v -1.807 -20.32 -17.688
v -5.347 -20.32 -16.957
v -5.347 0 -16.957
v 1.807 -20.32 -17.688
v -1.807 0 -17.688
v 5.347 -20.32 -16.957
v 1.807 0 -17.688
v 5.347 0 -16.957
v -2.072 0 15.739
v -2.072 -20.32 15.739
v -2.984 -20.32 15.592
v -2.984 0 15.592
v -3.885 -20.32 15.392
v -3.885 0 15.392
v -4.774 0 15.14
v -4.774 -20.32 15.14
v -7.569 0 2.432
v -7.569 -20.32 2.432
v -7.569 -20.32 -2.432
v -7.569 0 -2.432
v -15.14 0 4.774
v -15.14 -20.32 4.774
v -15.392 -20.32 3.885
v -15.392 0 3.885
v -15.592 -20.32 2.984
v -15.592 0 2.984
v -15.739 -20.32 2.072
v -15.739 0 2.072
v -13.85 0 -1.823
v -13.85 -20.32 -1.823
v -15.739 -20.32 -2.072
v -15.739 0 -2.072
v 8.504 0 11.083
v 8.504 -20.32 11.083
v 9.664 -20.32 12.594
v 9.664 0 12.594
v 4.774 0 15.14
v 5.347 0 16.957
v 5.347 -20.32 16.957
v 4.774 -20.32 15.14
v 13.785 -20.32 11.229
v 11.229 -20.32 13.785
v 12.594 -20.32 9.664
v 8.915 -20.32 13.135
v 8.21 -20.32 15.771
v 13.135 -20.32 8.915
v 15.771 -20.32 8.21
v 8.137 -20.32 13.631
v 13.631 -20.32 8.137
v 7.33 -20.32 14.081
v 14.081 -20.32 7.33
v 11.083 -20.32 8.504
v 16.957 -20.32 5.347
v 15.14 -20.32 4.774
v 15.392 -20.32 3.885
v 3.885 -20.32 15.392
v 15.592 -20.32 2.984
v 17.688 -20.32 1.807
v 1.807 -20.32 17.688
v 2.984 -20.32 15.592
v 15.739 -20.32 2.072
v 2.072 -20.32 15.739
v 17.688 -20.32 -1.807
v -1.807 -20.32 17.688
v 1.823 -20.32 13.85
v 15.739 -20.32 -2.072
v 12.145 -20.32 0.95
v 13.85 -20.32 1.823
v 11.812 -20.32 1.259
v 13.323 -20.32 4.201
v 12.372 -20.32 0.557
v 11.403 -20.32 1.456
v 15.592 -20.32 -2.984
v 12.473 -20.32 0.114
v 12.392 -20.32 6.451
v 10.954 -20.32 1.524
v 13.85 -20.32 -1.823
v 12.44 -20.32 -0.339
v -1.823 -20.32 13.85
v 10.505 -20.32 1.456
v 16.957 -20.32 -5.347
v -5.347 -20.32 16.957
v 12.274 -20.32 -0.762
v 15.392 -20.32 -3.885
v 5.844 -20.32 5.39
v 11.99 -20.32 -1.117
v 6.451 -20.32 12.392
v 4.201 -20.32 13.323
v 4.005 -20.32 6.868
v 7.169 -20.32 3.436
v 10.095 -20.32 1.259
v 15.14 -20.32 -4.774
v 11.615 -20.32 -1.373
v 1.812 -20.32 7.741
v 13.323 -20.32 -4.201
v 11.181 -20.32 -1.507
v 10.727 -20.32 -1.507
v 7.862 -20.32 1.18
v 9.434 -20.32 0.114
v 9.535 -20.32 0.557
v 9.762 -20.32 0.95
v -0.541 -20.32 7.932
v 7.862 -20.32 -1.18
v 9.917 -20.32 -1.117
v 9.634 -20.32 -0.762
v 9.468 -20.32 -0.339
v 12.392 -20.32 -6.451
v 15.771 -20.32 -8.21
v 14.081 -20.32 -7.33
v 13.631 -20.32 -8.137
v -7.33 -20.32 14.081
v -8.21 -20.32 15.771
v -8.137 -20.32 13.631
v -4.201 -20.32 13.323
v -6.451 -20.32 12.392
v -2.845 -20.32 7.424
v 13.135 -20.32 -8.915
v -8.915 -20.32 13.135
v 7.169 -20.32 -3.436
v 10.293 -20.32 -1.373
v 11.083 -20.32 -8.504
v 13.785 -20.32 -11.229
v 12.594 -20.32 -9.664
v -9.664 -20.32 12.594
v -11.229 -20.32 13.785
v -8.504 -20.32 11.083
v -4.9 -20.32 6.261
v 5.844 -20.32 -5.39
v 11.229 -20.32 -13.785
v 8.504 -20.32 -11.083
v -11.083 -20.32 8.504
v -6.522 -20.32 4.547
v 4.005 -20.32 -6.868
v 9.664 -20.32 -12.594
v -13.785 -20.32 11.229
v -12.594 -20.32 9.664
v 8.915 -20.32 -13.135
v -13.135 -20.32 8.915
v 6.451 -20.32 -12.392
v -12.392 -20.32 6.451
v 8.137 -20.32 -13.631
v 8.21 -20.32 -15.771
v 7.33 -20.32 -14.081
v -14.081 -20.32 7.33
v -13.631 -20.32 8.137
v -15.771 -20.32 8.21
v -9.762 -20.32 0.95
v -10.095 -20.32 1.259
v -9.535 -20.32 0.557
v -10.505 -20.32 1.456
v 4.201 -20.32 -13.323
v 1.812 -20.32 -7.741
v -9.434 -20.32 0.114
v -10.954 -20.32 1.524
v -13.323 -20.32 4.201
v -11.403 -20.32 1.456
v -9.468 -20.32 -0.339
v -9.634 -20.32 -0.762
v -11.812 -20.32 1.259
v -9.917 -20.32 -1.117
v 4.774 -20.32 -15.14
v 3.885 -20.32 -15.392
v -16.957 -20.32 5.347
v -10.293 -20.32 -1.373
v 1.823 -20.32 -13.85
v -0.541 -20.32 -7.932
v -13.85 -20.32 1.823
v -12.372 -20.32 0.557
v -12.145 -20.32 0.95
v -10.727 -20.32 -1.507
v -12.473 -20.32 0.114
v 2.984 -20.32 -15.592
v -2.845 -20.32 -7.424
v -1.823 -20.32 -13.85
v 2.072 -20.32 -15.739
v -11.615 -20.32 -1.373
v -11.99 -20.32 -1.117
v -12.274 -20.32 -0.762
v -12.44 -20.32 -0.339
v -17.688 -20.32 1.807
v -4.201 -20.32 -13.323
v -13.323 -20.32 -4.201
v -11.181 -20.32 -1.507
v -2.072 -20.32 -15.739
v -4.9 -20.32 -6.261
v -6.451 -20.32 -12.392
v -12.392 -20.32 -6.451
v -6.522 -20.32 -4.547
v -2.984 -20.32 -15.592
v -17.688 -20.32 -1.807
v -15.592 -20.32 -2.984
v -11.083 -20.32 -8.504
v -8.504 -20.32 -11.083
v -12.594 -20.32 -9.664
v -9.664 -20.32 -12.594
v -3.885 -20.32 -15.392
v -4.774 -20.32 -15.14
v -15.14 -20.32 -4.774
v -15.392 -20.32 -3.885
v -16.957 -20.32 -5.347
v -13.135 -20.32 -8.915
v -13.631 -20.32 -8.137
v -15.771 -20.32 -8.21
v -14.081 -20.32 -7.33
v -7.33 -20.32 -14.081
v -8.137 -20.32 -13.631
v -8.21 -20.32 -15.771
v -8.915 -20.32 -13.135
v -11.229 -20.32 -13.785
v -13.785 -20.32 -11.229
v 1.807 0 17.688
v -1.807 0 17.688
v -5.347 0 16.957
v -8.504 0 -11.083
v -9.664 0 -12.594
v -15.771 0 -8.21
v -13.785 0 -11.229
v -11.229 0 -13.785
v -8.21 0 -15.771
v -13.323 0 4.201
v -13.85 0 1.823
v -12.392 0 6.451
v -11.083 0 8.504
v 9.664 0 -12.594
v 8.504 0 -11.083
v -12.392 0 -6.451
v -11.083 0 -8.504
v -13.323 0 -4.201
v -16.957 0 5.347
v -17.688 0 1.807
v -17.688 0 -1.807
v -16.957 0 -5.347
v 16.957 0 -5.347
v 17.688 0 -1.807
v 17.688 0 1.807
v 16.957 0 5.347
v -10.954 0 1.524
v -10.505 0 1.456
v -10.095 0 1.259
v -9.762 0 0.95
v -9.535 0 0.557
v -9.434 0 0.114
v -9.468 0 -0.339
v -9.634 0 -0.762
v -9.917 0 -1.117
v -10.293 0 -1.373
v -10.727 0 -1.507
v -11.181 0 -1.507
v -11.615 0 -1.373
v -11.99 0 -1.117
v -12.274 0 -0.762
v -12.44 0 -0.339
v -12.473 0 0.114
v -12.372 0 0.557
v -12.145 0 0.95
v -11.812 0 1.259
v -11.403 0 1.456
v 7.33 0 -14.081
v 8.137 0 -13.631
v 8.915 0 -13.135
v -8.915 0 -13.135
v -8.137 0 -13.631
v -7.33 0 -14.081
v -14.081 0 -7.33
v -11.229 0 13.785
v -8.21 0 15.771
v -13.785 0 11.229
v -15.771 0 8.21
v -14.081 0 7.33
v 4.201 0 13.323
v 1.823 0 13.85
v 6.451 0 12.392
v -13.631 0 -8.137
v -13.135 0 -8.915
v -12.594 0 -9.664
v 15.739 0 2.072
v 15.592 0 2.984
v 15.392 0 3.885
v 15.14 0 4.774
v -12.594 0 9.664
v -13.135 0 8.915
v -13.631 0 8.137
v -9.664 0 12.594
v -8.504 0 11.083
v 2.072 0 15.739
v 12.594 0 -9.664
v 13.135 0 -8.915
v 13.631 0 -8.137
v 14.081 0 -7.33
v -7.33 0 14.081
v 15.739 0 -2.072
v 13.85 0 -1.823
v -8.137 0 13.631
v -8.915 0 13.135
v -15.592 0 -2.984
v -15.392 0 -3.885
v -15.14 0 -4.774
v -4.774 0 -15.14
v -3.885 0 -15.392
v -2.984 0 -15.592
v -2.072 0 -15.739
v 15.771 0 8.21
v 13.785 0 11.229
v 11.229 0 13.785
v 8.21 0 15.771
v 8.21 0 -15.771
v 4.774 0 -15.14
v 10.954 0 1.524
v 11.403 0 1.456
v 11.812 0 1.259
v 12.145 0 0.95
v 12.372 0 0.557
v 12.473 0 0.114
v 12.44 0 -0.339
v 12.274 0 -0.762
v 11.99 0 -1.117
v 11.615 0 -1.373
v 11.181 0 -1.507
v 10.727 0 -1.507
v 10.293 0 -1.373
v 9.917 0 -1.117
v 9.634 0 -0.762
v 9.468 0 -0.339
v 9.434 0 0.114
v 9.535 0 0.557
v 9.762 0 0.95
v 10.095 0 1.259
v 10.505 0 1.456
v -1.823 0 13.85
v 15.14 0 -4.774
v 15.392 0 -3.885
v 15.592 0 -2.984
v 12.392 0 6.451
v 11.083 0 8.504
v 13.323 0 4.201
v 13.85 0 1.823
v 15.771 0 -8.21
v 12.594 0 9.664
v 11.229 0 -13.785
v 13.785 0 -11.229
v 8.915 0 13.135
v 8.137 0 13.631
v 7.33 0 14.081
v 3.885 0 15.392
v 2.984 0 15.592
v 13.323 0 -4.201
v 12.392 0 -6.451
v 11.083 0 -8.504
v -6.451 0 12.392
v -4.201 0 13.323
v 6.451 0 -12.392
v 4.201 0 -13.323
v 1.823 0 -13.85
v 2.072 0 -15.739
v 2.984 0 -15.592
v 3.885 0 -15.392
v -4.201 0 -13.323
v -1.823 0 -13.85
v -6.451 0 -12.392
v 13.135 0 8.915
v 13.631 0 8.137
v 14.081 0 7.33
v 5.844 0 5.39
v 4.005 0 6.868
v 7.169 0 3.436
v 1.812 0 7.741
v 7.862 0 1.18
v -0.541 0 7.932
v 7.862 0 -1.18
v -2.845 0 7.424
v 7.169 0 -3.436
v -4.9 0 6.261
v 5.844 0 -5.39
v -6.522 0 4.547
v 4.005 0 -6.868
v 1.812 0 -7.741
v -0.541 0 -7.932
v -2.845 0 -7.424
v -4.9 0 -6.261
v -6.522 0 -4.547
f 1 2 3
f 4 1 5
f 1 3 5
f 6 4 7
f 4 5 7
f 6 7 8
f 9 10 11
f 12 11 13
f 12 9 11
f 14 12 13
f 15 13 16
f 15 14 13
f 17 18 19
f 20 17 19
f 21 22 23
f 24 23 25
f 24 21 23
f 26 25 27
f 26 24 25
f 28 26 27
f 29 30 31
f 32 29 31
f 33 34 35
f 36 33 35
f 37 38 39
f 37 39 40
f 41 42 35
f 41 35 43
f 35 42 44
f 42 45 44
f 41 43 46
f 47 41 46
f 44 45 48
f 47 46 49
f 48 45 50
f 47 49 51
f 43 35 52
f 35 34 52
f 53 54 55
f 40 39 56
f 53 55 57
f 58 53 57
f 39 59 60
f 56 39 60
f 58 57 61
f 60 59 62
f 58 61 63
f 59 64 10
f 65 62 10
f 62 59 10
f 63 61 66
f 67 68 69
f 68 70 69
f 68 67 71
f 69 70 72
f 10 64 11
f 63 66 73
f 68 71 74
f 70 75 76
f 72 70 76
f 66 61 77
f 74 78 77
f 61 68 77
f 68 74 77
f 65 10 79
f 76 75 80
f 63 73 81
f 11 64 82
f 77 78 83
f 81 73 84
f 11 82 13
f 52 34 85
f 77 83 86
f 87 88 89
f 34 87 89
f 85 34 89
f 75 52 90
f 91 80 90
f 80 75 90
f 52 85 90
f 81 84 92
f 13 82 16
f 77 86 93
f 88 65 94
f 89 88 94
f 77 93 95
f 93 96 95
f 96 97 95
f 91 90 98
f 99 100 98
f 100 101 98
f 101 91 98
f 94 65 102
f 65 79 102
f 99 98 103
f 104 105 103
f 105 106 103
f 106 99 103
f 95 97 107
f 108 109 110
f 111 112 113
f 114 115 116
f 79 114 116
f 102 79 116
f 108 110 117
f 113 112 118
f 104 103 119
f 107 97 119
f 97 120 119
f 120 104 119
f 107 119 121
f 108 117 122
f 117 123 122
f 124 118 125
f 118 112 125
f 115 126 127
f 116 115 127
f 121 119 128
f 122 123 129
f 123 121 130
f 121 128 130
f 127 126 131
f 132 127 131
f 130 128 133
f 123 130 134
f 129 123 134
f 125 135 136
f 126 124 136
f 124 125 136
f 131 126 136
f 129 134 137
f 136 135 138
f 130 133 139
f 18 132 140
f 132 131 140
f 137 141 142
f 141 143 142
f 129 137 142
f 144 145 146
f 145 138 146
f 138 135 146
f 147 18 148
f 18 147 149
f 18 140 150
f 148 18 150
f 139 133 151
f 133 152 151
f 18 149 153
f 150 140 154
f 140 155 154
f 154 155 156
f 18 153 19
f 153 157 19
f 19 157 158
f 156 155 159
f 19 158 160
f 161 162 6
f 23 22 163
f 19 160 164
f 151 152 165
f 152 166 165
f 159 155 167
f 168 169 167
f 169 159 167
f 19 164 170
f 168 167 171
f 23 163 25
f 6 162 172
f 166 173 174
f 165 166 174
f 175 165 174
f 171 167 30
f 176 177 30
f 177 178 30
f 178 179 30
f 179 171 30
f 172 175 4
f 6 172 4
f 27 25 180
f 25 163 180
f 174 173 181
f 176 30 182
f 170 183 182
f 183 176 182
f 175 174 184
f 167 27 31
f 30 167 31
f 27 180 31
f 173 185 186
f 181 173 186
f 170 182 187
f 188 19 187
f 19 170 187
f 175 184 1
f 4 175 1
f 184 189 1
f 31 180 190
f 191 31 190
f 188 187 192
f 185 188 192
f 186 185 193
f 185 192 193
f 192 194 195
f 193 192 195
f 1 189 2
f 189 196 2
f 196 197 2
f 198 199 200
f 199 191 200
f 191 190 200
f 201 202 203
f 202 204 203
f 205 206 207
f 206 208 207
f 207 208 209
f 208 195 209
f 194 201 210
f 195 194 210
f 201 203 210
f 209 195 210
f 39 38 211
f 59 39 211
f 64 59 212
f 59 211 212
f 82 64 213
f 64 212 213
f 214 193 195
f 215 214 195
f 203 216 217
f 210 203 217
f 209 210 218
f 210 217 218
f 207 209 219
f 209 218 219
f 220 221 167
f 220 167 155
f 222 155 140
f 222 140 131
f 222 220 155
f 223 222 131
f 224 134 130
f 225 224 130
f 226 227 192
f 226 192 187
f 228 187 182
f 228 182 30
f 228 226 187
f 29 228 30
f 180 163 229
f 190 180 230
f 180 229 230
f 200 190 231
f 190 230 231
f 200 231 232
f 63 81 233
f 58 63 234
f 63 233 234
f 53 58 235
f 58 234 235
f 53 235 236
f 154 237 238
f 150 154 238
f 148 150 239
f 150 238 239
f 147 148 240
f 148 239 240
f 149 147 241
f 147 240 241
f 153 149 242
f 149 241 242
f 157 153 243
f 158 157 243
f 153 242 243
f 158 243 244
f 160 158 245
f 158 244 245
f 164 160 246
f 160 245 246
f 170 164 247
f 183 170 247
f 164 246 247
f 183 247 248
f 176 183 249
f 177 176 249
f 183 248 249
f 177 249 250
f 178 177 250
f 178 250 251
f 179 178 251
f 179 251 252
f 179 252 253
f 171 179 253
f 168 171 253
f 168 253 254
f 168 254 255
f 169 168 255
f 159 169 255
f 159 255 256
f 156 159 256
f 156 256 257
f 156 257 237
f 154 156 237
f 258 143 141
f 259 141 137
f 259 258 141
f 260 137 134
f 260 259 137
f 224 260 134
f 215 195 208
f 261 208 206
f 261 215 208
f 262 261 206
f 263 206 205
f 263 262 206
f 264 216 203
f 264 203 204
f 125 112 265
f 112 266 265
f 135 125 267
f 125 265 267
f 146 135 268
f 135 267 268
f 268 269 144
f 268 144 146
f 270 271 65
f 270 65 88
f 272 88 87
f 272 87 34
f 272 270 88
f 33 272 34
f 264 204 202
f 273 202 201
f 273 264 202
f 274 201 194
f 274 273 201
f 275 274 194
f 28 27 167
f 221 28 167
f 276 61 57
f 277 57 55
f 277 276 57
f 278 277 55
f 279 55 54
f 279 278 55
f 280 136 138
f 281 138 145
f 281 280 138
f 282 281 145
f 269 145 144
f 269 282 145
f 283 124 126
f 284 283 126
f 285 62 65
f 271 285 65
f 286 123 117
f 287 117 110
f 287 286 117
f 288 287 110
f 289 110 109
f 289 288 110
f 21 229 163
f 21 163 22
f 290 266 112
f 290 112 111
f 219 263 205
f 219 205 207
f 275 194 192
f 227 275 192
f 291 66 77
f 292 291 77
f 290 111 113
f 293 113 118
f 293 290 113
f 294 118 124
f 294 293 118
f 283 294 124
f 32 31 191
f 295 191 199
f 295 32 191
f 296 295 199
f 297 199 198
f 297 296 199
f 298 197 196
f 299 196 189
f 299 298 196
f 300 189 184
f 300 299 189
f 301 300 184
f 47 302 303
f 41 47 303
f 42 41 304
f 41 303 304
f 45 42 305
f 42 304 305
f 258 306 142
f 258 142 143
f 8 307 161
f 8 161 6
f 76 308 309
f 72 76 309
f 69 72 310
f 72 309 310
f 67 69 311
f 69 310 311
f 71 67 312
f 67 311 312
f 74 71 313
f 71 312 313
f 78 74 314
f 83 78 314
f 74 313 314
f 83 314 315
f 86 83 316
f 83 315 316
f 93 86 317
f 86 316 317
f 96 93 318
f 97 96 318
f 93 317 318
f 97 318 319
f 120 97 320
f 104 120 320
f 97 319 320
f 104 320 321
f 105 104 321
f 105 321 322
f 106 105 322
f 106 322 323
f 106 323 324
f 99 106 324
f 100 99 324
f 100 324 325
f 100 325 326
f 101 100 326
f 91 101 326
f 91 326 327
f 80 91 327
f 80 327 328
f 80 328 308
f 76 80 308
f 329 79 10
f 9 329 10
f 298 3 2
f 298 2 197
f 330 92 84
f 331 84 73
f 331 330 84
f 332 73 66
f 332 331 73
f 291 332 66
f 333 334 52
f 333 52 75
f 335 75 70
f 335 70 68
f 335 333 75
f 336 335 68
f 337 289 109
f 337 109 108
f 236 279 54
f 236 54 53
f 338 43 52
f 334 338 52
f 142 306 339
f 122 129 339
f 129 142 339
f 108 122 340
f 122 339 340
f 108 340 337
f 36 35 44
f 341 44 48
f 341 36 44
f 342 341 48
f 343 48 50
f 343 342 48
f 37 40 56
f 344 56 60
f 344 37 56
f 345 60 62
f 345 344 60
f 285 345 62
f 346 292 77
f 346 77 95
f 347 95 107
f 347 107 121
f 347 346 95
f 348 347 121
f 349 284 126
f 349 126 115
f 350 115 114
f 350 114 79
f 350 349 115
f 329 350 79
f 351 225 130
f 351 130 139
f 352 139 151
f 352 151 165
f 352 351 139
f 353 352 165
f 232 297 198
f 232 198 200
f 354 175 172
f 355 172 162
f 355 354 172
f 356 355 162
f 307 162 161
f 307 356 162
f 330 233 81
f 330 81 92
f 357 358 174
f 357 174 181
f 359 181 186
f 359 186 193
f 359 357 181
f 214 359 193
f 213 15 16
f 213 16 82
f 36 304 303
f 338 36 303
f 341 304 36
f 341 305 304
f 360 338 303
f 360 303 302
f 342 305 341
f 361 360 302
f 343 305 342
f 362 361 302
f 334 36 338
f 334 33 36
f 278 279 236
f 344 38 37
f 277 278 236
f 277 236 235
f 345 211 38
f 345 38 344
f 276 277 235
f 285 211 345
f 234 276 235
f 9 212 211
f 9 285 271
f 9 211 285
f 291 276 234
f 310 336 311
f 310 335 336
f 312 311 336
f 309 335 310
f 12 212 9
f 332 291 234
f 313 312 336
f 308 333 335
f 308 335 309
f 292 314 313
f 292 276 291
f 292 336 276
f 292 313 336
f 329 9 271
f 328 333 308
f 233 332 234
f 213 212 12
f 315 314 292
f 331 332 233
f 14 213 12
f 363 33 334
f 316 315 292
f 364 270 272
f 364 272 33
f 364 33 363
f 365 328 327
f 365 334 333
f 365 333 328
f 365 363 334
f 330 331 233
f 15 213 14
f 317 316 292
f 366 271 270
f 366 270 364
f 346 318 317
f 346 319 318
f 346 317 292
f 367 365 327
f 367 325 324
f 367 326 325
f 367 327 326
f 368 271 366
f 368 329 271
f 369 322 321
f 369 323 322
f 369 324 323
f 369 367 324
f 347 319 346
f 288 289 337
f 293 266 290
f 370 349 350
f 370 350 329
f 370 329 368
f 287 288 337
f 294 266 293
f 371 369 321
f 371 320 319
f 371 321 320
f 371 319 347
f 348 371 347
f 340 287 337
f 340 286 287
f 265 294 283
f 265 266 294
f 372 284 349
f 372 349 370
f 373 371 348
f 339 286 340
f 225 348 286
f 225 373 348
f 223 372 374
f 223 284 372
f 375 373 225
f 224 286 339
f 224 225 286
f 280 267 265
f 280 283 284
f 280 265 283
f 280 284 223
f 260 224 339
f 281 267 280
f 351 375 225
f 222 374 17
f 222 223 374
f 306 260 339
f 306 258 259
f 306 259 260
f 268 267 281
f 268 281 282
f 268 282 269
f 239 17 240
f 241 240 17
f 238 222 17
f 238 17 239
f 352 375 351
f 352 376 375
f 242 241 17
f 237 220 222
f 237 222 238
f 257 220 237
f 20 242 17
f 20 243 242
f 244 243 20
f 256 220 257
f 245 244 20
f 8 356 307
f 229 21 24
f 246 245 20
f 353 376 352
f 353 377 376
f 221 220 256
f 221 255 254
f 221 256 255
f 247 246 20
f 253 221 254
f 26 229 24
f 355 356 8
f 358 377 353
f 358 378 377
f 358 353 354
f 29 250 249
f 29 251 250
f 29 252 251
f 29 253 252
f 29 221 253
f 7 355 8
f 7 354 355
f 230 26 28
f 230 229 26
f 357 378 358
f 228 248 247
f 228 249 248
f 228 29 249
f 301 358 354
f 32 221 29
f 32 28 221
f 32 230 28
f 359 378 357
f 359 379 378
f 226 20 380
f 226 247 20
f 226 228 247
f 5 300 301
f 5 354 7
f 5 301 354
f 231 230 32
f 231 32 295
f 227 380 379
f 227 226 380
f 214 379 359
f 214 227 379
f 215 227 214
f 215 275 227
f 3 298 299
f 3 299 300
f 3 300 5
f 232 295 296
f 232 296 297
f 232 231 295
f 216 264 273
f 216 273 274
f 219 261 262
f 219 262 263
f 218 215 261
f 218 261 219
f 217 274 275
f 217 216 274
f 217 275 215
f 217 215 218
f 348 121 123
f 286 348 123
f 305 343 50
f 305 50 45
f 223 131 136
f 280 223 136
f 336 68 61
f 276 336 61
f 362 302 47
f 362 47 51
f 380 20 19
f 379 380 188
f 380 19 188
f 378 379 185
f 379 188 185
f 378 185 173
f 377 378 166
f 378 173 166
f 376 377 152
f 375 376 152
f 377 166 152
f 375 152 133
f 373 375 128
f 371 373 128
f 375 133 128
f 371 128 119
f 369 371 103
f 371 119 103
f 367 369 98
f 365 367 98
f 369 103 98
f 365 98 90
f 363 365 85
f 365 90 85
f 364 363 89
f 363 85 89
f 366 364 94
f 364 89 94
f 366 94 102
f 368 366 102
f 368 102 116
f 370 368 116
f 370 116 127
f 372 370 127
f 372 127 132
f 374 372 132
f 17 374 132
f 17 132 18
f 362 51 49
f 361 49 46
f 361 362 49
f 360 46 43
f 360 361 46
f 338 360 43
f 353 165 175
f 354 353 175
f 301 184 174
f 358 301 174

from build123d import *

# Parameters (mm, degrees)
SKETCH1_W           = 5.08
SKETCH1_H           = 0.3048
CUT_EXTRUDE1_DEPTH  = 33.328922036
CIRPATTERN1_COUNT   = 8
BOSS_EXTRUDE1_START = -20.32
BOSS_EXTRUDE1_DEPTH = 20.32
SKETCH8_R           = 1.524
CUT_EXTRUDE2_DEPTH  = 33.328922036


with BuildPart() as part:
    # Sketch1 → Revolve1 (revolve)
    with BuildSketch(Plane.YZ):
        with Locations((-2.54, 14.4526)):
            Rectangle(SKETCH1_W, SKETCH1_H)
        Polygon((0, 14.3002), (0, 7.9502), (-20.32, 7.9502), (-20.32, 17.78), (0, 17.78), (0, 14.605), (-5.08, 14.605), (-5.08, 14.3002), align=None)
    revolve(axis=Axis((0, 0, 0), (0, -1, 0)))

    # Sketch2 → Cut-Extrude1 (cut, through all)
    with BuildSketch(Plane(origin=(0, 0, 0), x_dir=(-1, 0, 0), z_dir=(0, 1, 0))):
        with BuildLine():
            ThreePointArc((15.771052614, 8.209890343), (16.426578088, 6.804111427), (16.957087384, 5.346549115))
            Line((16.957087384, 5.346549115), (15.140256593, 4.773704567))
            ThreePointArc((15.140256593, 4.773704567), (15.498699113, 3.435978871), (15.739187174, 2.072103301))
            Line((15.739187174, 2.072103301), (13.850484713, 1.823450905))
            ThreePointArc((13.850484713, 1.823450905), (12.906597069, 5.34608755), (11.083146164, 8.504397163))
            Line((11.083146164, 8.504397163), (12.594484277, 9.664087686))
            ThreePointArc((12.594484277, 9.664087686), (13.388839202, 8.529631283), (14.081296977, 7.330259235))
            Line((14.081296977, 7.330259235), (15.771052614, 8.209890343))
        make_face()
    cut_extrude1 = extrude(amount=-CUT_EXTRUDE1_DEPTH, mode=Mode.SUBTRACT)

    # CirPattern1: Cut-Extrude1 ×8 about axis
    cirpattern1_axis = Axis((0, 0, 0), (0, 1, 0))
    for i in range(1, CIRPATTERN1_COUNT):
        add(cut_extrude1.rotate(cirpattern1_axis, i * 360 / CIRPATTERN1_COUNT), mode=Mode.SUBTRACT)

    # Sketch5 → Boss-Extrude1 (add)
    with BuildSketch(Plane(origin=(0, 0, 0), x_dir=(1, 0, 0), z_dir=(0, 1, 0)).offset(BOSS_EXTRUDE1_START)):
        with BuildLine():
            Line((-7.5692, -2.431643765), (-7.5692, 2.431643765))
            ThreePointArc((-7.5692, 2.431643765), (-7.9502, 0), (-7.5692, -2.431643765))
        make_face()
    extrude(amount=BOSS_EXTRUDE1_DEPTH)

    # Sketch8 → Cut-Extrude2 (cut, through all)
    with BuildSketch(Plane(origin=(0, 0, 0), x_dir=(-1, 0, 0), z_dir=(0, 1, 0))):
        with Locations(Location((-10.95375, 0, 0), (0, 0, 90))):
            Circle(SKETCH8_R)
        with Locations(Location((10.95375, 0, 0), (0, 0, 90))):
            Circle(SKETCH8_R)
    extrude(amount=-CUT_EXTRUDE2_DEPTH, mode=Mode.SUBTRACT)


solid = part.part
